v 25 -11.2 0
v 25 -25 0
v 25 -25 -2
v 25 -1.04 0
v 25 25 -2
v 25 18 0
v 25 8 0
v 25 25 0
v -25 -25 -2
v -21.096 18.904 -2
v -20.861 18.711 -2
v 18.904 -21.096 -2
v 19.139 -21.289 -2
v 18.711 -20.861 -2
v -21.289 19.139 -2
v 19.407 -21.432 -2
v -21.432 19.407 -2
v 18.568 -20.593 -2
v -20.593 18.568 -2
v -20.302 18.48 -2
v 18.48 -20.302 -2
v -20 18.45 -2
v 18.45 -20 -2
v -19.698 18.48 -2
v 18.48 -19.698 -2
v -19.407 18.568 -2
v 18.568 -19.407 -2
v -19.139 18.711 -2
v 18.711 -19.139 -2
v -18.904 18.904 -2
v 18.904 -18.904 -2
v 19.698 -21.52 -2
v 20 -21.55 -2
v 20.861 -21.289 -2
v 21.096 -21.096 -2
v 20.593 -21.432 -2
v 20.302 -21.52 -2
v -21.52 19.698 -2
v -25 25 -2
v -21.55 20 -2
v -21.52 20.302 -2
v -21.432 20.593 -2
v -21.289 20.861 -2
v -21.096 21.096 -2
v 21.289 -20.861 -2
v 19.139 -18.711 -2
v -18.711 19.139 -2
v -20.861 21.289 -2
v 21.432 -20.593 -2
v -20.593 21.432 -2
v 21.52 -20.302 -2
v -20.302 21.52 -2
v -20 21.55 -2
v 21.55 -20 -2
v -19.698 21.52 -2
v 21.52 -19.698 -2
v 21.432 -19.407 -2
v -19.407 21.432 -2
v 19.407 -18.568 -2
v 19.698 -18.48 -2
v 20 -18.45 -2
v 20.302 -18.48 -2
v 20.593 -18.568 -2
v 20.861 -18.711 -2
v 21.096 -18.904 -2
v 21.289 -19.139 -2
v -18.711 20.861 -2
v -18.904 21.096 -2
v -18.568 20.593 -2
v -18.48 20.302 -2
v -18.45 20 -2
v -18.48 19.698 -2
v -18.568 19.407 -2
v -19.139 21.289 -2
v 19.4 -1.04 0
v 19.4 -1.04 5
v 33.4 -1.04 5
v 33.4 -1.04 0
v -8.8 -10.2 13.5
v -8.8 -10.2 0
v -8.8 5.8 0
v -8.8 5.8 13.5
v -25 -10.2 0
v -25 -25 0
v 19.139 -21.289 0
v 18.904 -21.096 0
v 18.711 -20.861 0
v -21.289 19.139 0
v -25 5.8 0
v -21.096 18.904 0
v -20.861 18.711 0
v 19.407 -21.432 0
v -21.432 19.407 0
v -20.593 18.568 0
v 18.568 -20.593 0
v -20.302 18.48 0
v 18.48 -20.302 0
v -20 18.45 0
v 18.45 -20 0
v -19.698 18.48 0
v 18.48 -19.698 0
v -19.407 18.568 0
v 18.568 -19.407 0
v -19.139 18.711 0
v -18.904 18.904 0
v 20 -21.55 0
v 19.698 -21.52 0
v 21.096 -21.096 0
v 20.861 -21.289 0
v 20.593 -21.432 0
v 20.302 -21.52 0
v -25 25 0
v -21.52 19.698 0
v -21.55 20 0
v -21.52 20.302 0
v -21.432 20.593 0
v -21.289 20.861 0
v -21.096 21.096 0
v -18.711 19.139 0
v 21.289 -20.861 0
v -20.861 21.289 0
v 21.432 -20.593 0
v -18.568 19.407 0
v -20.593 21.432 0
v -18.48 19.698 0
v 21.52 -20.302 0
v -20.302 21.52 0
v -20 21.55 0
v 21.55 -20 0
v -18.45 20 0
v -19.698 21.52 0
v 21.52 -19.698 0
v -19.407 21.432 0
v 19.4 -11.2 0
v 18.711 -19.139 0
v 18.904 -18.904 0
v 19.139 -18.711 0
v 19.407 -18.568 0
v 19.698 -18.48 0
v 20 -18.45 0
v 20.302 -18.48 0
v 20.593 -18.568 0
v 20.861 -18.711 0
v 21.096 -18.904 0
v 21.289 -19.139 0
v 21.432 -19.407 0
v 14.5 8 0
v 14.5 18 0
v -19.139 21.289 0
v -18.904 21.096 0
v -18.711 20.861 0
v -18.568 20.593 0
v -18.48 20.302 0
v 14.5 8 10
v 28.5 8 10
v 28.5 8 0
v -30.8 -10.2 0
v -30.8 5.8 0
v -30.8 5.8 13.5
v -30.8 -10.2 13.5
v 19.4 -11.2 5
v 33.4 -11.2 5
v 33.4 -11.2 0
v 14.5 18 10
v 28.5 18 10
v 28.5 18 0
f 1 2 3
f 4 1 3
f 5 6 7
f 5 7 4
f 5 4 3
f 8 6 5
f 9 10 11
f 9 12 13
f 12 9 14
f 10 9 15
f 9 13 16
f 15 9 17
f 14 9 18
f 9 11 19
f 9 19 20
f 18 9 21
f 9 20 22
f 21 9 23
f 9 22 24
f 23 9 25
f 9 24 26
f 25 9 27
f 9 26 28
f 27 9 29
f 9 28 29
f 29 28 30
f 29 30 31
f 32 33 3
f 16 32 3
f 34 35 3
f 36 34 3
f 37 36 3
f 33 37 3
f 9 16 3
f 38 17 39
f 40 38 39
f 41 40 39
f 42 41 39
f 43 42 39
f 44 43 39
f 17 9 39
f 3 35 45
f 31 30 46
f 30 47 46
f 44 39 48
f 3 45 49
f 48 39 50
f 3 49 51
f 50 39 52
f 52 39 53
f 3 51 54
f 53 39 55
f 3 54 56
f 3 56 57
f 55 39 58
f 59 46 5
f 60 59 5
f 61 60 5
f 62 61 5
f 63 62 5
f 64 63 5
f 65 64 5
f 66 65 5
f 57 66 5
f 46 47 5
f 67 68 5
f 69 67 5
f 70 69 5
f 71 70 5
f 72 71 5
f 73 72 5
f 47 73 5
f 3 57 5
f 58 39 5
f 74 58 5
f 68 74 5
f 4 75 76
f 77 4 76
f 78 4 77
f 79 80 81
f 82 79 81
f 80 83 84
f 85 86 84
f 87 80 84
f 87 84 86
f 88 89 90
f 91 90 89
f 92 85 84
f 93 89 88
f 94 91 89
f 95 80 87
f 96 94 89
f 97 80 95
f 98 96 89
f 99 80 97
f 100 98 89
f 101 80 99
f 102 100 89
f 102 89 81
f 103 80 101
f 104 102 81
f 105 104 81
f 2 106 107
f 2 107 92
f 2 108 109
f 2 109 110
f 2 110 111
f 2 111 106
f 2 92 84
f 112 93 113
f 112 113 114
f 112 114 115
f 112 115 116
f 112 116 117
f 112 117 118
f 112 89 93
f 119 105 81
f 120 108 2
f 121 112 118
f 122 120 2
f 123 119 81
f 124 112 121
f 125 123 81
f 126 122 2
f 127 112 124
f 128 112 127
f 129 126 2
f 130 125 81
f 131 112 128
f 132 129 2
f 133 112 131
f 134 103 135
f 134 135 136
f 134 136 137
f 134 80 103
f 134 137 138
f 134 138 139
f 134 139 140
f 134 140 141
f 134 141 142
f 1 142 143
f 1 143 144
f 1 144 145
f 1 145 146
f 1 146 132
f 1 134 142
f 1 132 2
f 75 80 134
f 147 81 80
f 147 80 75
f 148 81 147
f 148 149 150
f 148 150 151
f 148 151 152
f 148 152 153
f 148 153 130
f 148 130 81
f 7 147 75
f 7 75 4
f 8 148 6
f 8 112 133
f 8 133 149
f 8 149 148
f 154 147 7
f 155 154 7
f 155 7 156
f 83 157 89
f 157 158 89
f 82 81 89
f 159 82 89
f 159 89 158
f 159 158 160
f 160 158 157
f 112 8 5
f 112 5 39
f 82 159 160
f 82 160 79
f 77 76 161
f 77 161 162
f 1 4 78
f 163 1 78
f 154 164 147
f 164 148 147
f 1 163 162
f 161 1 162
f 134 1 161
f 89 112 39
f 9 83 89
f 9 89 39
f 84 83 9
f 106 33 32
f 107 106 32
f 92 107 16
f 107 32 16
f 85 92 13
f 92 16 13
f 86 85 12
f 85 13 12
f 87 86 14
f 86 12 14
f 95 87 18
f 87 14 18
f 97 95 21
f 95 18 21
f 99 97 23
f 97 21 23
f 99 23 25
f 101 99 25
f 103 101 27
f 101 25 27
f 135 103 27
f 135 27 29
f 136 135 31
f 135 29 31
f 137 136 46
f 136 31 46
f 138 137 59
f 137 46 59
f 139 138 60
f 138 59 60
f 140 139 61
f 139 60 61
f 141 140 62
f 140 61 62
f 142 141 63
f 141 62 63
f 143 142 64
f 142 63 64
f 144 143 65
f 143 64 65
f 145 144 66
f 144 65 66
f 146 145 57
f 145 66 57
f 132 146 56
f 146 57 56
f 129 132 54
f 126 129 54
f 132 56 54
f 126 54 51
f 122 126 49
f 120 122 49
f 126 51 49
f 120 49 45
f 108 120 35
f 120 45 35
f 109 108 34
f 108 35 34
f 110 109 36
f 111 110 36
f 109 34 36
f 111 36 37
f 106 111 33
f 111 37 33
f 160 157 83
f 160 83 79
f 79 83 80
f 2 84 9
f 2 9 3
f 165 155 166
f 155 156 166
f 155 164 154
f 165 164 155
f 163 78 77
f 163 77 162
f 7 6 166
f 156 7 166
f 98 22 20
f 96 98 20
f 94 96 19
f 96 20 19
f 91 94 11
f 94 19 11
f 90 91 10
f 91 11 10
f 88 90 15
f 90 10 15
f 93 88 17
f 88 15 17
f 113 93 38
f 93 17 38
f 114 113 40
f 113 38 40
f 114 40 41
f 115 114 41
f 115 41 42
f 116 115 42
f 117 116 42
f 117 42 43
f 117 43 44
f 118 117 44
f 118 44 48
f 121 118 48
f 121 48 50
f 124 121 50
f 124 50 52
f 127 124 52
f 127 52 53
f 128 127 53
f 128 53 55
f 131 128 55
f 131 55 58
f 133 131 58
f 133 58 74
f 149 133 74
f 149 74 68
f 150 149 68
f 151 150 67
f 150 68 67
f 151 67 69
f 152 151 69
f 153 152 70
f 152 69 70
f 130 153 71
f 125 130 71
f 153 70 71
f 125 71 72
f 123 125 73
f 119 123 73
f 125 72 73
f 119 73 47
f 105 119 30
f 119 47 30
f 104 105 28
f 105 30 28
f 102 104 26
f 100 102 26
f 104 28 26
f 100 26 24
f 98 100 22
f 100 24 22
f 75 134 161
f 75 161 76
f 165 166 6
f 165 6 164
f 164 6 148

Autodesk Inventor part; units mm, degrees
ref_plane "YZ Plane" through (0, 0, 0) normal (1, 0, 0) x (0, 1, 0)
ref_plane "XZ Plane" through (0, 0, 0) normal (0, 1, 0) x (-1, 0, 0)
ref_plane "XY Plane" through (0, 0, 0) normal (0, 0, 1) x (1, 0, 0)
sketch "Platine" plane through (0, 0, 0) normal (0, 0, 1) x (1, 0, 0)
  line L0 (-25, -25) -> (25, -25)
  line L1 (25, -25) -> (25, 25)
  line L2 (25, 25) -> (-25, 25)
  line L3 (-25, 25) -> (-25, -25)
  line L4 (-25, -25) -> (25, 25)
  line L5 (25, -25) -> (-25, 25)
  line L6 (-30.8, -10.2) -> (-8.8, -10.2)
  line L7 (-8.8, -10.2) -> (-8.8, 5.8)
  line L8 (-8.8, 5.8) -> (-30.8, 5.8)
  line L9 (-30.8, 5.8) -> (-30.8, -10.2)
  line L10 (33.4, -11.2) -> (19.4, -11.2)
  line L11 (19.4, -11.2) -> (19.4, -1.04)
  line L12 (19.4, -1.04) -> (33.4, -1.04)
  line L13 (33.4, -1.04) -> (33.4, -11.2)
  line L14 (14.5, 8) -> (28.5, 8)
  line L15 (28.5, 8) -> (28.5, 18)
  line L16 (28.5, 18) -> (14.5, 18)
  line L17 (14.5, 18) -> (14.5, 8)
  circle A0 centre (-20, 20) radius 1.5
  circle A1 centre (20, -20) radius 1.5
  point P0 (0, 0)
  point P1 (0, 0)
  dimension "d0" = 50
  dimension "d1" = 50
  dimension "d2" = 22
  dimension "d3" = 16
  dimension "d4" = 14.8
  dimension "d5" = 5.8
  dimension "d6" = 14
  dimension "d7" = 10.16
  dimension "d8" = 13.8
  dimension "d9" = 44.4
  dimension "d10" = 10
  dimension "d11" = 14
  dimension "d12" = 33
  dimension "d13" = 10.5
  dimension "d14" = 3
  dimension "d15" = 5
  dimension "d16" = 5
  dimension "d17" = 5
  dimension "d18" = 5
  dimension "d19" = 18
  dimension "d20" = 33.4
extrude "Platinengeometrie" add sketch "Platine" against normal blind 2 contours L4 L6 L7 L5 A1 L0 | L3 L6 L4 | L5 A1 L4 L17 L14 L1 L12 L11 L10 | L3 L8 L7 L4 L6 | L4 L7 L6 | L10 L11 L12 L1 | A1 L5 | L5 A1 | L3 L5 A0 L4 L7 L8 | L2 L4 L16 L17 L5 A0 | L14 L17 L4 L16 L1 | L1 L16 L4 | A0 L5 | L5 A0 | L17 L16 L4
sketch "Platine2" plane through (0, 0, 0) normal (0, 0, 1) x (1, 0, 0)
  line L0 (-25, -25) -> (25, -25)
  line L1 (25, -25) -> (25, 25)
  line L2 (25, 25) -> (-25, 25)
  line L3 (-25, 25) -> (-25, -25)
  line L4 (-25, -25) -> (25, 25)
  line L5 (25, -25) -> (-25, 25)
  line L6 (-30.8, -10.2) -> (-8.8, -10.2)
  line L7 (-8.8, -10.2) -> (-8.8, 5.8)
  line L8 (-8.8, 5.8) -> (-30.8, 5.8)
  line L9 (-30.8, 5.8) -> (-30.8, -10.2)
  line L10 (33.4, -11.2) -> (19.4, -11.2)
  line L11 (19.4, -11.2) -> (19.4, -1.04)
  line L12 (19.4, -1.04) -> (33.4, -1.04)
  line L13 (33.4, -1.04) -> (33.4, -11.2)
  line L14 (14.5, 8) -> (28.5, 8)
  line L15 (28.5, 8) -> (28.5, 18)
  line L16 (28.5, 18) -> (14.5, 18)
  line L17 (14.5, 18) -> (14.5, 8)
  circle A0 centre (-20, 20) radius 1.5
  circle A1 centre (20, -20) radius 1.5
  point P0 (0, 0)
  point P1 (0, 0)
  point P2 (0, 0)
  dimension "d23" = 50
  dimension "d24" = 50
  dimension "d25" = 22
  dimension "d26" = 16
  dimension "d27" = 14.8
  dimension "d28" = 5.8
  dimension "d29" = 14
  dimension "d30" = 10.16
  dimension "d31" = 13.8
  dimension "d32" = 44.4
  dimension "d33" = 10
  dimension "d34" = 14
  dimension "d35" = 33
  dimension "d36" = 10.5
  dimension "d37" = 3
  dimension "d38" = 5
  dimension "d39" = 5
  dimension "d40" = 5
  dimension "d41" = 5
  dimension "d42" = 18
  dimension "d43" = 33.4
extrude "MEBP 8-8G" add sketch "Platine2" along normal blind 13.5 contours L6 L9 L8 L3 | L3 L8 L7 L4 L6 | L4 L7 L6
sketch "Platine3" plane through (0, 0, 0) normal (0, 0, 1) x (1, 0, 0)
  line L0 (-25, -25) -> (25, -25)
  line L1 (25, -25) -> (25, 25)
  line L2 (25, 25) -> (-25, 25)
  line L3 (-25, 25) -> (-25, -25)
  line L4 (-25, -25) -> (25, 25)
  line L5 (25, -25) -> (-25, 25)
  line L6 (-30.8, -10.2) -> (-8.8, -10.2)
  line L7 (-8.8, -10.2) -> (-8.8, 5.8)
  line L8 (-8.8, 5.8) -> (-30.8, 5.8)
  line L9 (-30.8, 5.8) -> (-30.8, -10.2)
  line L10 (33.4, -11.2) -> (19.4, -11.2)
  line L11 (19.4, -11.2) -> (19.4, -1.04)
  line L12 (19.4, -1.04) -> (33.4, -1.04)
  line L13 (33.4, -1.04) -> (33.4, -11.2)
  line L14 (14.5, 8) -> (28.5, 8)
  line L15 (28.5, 8) -> (28.5, 18)
  line L16 (28.5, 18) -> (14.5, 18)
  line L17 (14.5, 18) -> (14.5, 8)
  circle A0 centre (-20, 20) radius 1.5
  circle A1 centre (20, -20) radius 1.5
  point P0 (0, 0)
  point P1 (0, 0)
  point P2 (0, 0)
  dimension "d46" = 50
  dimension "d47" = 50
  dimension "d48" = 22
  dimension "d49" = 16
  dimension "d50" = 14.8
  dimension "d51" = 5.8
  dimension "d52" = 14
  dimension "d53" = 10.16
  dimension "d54" = 13.8
  dimension "d55" = 44.4
  dimension "d56" = 10
  dimension "d57" = 14
  dimension "d58" = 33
  dimension "d59" = 10.5
  dimension "d60" = 3
  dimension "d61" = 5
  dimension "d62" = 5
  dimension "d63" = 5
  dimension "d64" = 5
  dimension "d65" = 18
  dimension "d66" = 33.4
extrude "PSS 254/4W" add sketch "Platine3" along normal blind 5 contours L10 L11 L12 L1 | L1 L12 L13 L10
sketch "Sketch4" plane through (0, 0, 0) normal (0, 0, 1) x (1, 0, 0)
  line L0 (-25, -25) -> (25, -25)
  line L1 (25, -25) -> (25, 25)
  line L2 (25, 25) -> (-25, 25)
  line L3 (-25, 25) -> (-25, -25)
  line L4 (-25, -25) -> (25, 25)
  line L5 (25, -25) -> (-25, 25)
  line L6 (-30.8, -10.2) -> (-8.8, -10.2)
  line L7 (-8.8, -10.2) -> (-8.8, 5.8)
  line L8 (-8.8, 5.8) -> (-30.8, 5.8)
  line L9 (-30.8, 5.8) -> (-30.8, -10.2)
  line L10 (33.4, -11.2) -> (19.4, -11.2)
  line L11 (19.4, -11.2) -> (19.4, -1.04)
  line L12 (19.4, -1.04) -> (33.4, -1.04)
  line L13 (33.4, -1.04) -> (33.4, -11.2)
  line L14 (14.5, 8) -> (28.5, 8)
  line L15 (28.5, 8) -> (28.5, 18)
  line L16 (28.5, 18) -> (14.5, 18)
  line L17 (14.5, 18) -> (14.5, 8)
  circle A0 centre (-20, 20) radius 1.5
  circle A1 centre (20, -20) radius 1.5
  point P0 (0, 0)
  point P1 (0, 0)
  point P2 (0, 0)
  dimension "d69" = 50
  dimension "d70" = 50
  dimension "d71" = 22
  dimension "d72" = 16
  dimension "d73" = 14.8
  dimension "d74" = 5.8
  dimension "d75" = 14
  dimension "d76" = 10.16
  dimension "d77" = 13.8
  dimension "d78" = 44.4
  dimension "d79" = 10
  dimension "d80" = 14
  dimension "d81" = 33
  dimension "d82" = 10.5
  dimension "d83" = 3
  dimension "d84" = 5
  dimension "d85" = 5
  dimension "d86" = 5
  dimension "d87" = 5
  dimension "d88" = 18
  dimension "d89" = 33.4
extrude "HEBG9 25" add sketch "Sketch4" along normal blind 10 contours L14 L17 L4 L16 L1 | L1 L16 L15 L14 | L17 L16 L4
sketch "Sketch5" plane through (0, 0, 0) normal (0, 0, 1) x (1, 0, 0)
  line L0 (-25, -25) -> (25, -25)
  line L1 (25, -25) -> (25, 25)
  line L2 (25, 25) -> (-25, 25)
  line L3 (-25, 25) -> (-25, -25)
  line L4 (-25, -25) -> (25, 25)
  line L5 (25, -25) -> (-25, 25)
  line L6 (-30.8, -10.2) -> (-8.8, -10.2)
  line L7 (-8.8, -10.2) -> (-8.8, 5.8)
  line L8 (-8.8, 5.8) -> (-30.8, 5.8)
  line L9 (-30.8, 5.8) -> (-30.8, -10.2)
  line L10 (33.4, -11.2) -> (19.4, -11.2)
  line L11 (19.4, -11.2) -> (19.4, -1.04)
  line L12 (19.4, -1.04) -> (33.4, -1.04)
  line L13 (33.4, -1.04) -> (33.4, -11.2)
  line L14 (14.5, 8) -> (28.5, 8)
  line L15 (28.5, 8) -> (28.5, 18)
  line L16 (28.5, 18) -> (14.5, 18)
  line L17 (14.5, 18) -> (14.5, 8)
  circle A0 centre (-20, 20) radius 1.5
  circle A1 centre (20, -20) radius 1.5
  point P0 (0, 0)
  point P1 (0, 0)
  point P2 (0, 0)
  dimension "d92" = 50
  dimension "d93" = 50
  dimension "d94" = 22
  dimension "d95" = 16
  dimension "d96" = 14.8
  dimension "d97" = 5.8
  dimension "d98" = 14
  dimension "d99" = 10.16
  dimension "d100" = 13.8
  dimension "d101" = 44.4
  dimension "d102" = 10
  dimension "d103" = 14
  dimension "d104" = 33
  dimension "d105" = 10.5
  dimension "d106" = 3
  dimension "d107" = 5
  dimension "d108" = 5
  dimension "d109" = 5
  dimension "d110" = 5
  dimension "d111" = 18
  dimension "d112" = 33.4
hole "Hole1" at (-20, 20, 0) at (20, -20, 0) direction (0, 0, -1) diameter 3.1 end through all
properties part number "PCB-Model"
